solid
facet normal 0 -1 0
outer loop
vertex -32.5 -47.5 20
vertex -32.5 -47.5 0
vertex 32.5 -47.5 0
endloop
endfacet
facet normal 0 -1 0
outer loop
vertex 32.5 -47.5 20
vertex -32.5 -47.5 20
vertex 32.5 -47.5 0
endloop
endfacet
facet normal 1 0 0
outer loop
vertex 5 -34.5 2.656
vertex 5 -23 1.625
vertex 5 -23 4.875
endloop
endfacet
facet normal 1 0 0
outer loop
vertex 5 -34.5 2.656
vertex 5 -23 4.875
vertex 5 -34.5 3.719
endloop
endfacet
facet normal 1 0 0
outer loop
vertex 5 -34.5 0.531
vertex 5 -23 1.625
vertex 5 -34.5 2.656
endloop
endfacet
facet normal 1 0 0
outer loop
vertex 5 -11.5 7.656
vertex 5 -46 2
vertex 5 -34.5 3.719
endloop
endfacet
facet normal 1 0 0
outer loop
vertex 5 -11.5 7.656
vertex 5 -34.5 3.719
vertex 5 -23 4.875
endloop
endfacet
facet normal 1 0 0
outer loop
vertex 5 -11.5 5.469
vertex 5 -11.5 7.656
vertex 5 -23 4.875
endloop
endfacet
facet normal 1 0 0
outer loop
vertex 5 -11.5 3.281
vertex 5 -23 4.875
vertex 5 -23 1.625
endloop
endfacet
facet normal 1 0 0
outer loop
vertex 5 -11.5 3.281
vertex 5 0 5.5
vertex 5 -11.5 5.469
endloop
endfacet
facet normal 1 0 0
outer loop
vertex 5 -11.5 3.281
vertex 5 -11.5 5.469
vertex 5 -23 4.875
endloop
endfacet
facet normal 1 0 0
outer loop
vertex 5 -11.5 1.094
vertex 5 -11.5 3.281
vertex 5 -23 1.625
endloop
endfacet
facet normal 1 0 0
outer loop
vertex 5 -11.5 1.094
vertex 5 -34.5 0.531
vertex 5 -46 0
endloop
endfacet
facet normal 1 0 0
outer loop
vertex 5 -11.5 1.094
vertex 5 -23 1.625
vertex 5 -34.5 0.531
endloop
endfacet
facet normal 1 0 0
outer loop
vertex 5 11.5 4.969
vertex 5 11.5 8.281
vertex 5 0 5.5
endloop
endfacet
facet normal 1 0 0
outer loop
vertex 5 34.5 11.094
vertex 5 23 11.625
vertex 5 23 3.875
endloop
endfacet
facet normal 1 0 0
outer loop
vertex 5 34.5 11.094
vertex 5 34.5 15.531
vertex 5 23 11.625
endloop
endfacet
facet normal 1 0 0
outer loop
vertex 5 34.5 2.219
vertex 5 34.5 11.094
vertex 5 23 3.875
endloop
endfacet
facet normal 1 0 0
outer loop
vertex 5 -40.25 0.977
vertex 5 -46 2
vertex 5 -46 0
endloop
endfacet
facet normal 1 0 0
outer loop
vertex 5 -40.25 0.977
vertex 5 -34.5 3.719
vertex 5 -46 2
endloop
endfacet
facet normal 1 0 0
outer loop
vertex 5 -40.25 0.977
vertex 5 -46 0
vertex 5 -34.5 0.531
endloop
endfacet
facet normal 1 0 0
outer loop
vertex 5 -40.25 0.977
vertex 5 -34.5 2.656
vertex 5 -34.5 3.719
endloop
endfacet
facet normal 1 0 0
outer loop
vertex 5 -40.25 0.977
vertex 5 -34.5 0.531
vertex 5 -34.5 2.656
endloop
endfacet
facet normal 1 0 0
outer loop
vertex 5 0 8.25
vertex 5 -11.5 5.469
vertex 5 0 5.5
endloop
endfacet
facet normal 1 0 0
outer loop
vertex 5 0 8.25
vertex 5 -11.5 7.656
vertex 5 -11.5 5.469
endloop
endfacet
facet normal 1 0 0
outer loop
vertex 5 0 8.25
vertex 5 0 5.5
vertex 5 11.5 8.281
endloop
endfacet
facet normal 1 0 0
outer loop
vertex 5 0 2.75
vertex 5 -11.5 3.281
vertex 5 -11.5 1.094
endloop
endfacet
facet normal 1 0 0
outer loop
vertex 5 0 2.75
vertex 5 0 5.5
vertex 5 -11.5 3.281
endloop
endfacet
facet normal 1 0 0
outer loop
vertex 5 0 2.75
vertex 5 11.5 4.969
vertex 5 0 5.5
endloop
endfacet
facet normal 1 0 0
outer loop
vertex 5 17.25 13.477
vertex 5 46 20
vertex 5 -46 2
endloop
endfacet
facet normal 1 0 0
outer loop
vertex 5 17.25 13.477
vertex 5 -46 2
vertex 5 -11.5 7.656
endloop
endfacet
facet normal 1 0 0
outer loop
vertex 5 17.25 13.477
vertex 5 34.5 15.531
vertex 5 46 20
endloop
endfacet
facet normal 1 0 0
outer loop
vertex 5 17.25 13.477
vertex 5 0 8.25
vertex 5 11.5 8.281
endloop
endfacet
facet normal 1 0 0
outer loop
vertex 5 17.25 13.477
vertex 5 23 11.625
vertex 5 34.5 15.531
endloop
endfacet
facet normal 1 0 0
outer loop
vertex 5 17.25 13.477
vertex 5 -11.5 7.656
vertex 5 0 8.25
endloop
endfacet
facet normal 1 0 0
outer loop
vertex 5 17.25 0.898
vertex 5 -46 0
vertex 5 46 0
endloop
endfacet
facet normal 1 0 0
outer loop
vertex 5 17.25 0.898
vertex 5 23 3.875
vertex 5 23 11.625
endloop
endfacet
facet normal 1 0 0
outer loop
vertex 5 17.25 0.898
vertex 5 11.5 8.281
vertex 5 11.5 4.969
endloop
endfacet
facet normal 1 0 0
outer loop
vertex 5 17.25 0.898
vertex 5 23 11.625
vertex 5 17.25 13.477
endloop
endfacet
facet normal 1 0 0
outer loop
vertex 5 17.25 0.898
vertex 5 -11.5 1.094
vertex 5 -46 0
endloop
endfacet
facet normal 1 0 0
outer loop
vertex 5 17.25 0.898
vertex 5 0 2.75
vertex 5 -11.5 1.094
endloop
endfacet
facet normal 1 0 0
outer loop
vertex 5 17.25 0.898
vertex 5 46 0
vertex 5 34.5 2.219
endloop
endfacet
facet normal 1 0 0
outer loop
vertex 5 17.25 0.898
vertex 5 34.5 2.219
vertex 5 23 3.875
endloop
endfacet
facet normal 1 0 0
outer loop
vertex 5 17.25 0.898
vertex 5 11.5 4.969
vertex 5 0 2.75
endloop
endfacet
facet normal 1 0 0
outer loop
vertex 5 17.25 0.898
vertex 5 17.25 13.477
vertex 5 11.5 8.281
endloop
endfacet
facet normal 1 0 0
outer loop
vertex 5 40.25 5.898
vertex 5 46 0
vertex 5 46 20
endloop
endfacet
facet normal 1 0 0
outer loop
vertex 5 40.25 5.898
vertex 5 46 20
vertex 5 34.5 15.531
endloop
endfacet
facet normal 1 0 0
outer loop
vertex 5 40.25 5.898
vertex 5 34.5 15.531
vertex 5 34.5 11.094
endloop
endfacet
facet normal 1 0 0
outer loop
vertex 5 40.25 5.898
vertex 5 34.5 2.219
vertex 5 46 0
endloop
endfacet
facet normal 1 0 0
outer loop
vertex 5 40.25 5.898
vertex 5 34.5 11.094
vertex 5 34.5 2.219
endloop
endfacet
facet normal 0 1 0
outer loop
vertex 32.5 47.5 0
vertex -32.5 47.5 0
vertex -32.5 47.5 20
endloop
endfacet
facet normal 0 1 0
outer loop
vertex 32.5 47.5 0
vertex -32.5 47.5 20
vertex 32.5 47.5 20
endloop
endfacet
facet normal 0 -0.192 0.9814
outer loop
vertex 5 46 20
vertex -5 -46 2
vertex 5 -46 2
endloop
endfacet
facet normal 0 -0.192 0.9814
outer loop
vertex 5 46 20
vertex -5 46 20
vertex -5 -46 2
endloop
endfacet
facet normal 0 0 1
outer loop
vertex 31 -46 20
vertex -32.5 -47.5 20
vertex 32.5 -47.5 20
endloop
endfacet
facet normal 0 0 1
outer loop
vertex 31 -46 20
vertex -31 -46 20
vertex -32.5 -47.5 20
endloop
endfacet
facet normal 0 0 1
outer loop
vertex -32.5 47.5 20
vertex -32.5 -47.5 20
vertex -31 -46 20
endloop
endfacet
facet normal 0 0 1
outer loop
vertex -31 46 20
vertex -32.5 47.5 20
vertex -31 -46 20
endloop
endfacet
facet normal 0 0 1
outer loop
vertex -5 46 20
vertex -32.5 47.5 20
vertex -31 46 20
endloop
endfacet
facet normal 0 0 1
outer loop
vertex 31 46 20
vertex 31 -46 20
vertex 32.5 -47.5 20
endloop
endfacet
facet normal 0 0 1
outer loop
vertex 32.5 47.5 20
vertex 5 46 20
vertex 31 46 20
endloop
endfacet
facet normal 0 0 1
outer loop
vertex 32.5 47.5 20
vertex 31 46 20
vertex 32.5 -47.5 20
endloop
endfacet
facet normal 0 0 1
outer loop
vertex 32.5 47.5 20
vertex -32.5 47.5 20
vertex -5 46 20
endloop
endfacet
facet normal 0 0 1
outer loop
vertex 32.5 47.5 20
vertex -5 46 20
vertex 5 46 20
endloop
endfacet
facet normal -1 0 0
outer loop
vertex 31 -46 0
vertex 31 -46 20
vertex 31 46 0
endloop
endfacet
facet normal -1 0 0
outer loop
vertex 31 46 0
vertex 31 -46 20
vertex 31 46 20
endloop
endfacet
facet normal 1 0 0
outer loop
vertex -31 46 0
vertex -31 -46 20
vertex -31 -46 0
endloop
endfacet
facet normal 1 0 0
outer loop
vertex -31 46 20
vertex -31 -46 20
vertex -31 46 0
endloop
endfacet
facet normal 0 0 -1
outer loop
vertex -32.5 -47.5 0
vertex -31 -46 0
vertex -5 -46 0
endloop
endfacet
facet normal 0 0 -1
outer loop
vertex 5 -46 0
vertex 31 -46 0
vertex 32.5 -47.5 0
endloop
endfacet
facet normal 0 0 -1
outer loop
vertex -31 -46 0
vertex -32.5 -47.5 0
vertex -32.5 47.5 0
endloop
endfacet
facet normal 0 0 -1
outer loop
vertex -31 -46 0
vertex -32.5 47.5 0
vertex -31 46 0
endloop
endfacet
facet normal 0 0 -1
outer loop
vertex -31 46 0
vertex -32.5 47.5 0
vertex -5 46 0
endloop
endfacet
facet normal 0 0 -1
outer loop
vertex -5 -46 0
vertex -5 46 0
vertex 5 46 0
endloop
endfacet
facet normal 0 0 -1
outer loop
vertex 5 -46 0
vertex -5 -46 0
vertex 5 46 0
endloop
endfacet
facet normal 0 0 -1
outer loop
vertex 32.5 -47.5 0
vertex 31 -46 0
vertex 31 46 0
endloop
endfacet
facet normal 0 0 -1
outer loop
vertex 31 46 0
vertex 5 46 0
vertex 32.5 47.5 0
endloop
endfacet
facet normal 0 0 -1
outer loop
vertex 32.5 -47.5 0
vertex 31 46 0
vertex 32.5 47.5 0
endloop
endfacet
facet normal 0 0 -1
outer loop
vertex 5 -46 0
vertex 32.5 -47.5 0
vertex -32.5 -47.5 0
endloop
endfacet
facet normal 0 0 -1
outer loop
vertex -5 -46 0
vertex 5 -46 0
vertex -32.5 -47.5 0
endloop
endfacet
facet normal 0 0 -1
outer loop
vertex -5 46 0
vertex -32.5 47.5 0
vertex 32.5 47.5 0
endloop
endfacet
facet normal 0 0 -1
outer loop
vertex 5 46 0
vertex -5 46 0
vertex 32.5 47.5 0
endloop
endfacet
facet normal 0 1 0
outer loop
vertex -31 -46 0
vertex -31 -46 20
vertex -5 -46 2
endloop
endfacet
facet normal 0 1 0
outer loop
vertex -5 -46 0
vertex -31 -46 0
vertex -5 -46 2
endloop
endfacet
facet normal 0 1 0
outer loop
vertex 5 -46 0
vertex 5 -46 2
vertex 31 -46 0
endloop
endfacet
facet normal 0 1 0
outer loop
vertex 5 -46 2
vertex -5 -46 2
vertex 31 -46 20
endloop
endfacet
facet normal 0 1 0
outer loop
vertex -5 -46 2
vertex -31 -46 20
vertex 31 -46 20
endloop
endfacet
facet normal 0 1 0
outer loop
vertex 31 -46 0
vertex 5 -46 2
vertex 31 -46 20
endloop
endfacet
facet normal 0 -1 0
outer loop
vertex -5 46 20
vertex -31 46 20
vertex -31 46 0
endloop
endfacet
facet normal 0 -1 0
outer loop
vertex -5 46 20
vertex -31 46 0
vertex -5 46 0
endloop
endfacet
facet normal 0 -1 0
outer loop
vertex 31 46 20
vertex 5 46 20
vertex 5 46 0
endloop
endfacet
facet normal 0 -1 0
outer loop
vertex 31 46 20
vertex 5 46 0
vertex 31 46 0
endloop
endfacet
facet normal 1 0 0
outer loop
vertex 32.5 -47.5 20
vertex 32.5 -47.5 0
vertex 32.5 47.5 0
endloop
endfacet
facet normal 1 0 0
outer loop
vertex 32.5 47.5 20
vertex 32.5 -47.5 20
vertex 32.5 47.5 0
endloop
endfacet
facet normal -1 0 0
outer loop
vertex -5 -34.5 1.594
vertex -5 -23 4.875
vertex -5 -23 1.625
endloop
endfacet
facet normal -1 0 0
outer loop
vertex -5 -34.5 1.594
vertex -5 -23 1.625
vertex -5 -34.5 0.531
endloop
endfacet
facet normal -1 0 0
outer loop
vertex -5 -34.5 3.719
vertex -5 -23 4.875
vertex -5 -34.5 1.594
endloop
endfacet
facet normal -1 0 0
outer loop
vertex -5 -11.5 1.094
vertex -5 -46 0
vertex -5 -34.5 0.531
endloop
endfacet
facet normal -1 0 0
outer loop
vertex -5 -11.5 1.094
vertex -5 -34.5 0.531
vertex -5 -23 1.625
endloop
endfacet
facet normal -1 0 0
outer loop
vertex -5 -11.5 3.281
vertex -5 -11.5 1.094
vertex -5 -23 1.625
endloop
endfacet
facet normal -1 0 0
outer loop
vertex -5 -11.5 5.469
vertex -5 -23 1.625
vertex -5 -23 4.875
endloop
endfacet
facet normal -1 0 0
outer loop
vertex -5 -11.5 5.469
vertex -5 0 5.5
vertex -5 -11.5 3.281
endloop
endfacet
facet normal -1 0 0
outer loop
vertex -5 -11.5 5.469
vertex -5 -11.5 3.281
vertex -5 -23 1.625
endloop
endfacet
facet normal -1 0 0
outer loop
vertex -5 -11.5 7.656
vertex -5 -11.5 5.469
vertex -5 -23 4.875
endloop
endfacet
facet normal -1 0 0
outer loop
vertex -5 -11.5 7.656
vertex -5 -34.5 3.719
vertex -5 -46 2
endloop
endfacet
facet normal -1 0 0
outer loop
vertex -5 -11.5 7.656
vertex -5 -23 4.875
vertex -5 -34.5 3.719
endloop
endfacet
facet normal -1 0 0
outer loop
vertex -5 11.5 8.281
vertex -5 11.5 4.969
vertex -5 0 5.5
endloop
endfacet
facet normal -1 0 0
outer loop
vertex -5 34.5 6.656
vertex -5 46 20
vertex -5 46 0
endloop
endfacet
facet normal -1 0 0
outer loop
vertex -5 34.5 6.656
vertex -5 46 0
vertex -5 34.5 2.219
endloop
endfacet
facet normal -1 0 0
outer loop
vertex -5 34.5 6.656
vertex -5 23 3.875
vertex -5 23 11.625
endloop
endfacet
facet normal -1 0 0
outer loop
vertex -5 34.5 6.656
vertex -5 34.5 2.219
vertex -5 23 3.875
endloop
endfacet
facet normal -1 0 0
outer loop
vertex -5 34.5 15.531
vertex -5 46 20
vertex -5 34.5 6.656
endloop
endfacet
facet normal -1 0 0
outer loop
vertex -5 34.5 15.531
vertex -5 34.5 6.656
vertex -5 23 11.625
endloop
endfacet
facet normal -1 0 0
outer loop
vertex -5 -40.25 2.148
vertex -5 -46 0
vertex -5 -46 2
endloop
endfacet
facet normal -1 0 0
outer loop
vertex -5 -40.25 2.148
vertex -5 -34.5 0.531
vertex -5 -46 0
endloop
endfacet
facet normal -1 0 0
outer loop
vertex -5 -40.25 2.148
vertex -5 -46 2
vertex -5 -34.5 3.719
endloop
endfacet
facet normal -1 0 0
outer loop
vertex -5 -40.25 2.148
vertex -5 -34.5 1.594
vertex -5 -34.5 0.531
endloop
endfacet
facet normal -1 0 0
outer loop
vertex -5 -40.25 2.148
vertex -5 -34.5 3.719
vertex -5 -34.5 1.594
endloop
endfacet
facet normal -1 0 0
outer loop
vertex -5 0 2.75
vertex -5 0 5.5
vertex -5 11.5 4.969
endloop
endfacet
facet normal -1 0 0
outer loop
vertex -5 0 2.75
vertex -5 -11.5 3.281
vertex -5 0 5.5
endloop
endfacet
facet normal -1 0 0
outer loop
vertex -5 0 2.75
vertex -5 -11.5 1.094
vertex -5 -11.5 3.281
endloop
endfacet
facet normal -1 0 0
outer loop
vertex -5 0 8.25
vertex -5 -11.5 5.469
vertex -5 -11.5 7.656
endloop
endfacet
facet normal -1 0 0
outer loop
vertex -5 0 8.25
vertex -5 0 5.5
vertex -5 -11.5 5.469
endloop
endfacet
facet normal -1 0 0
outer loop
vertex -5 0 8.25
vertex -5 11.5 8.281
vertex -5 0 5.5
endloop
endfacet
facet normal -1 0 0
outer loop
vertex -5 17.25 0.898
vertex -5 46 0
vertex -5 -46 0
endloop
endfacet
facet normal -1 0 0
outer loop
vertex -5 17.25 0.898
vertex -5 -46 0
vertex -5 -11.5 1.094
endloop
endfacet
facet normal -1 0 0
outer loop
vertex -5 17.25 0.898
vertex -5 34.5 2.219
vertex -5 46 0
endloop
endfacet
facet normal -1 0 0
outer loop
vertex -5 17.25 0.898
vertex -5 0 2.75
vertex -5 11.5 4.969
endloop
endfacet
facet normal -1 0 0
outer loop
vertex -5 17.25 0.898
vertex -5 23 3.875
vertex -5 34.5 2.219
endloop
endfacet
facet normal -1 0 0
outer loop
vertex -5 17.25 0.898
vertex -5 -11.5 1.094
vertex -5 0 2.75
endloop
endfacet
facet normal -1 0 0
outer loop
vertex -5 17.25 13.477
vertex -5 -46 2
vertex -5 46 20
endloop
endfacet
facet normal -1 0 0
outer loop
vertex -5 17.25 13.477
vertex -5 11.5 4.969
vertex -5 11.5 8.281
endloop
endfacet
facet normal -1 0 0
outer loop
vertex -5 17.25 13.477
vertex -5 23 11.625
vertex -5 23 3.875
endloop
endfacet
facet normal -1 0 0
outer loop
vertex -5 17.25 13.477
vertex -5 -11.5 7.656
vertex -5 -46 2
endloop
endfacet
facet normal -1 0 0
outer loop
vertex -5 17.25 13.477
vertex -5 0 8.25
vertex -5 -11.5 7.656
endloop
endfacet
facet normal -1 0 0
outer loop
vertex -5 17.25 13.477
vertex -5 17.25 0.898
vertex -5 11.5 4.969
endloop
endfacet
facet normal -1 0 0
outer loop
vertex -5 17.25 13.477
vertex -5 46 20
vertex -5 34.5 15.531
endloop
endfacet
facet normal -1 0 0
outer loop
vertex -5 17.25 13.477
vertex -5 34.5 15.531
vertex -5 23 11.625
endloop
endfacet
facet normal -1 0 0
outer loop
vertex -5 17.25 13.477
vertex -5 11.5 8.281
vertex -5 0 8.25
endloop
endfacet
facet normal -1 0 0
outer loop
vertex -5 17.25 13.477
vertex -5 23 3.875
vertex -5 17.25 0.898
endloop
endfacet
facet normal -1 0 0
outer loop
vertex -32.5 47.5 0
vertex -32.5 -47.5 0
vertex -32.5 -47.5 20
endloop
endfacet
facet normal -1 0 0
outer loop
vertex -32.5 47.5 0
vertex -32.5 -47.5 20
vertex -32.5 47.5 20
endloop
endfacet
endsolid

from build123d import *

# Parameters (mm, degrees)
F0_W     = 65
F0_H     = 95
F1_DEPTH = 20
F2_W     = 62
F2_H     = 92
F3_DEPTH = 20
F5_W     = 10
F5_H     = 2
F4_W     = 10
F4_H     = 20


with BuildPart() as f1:
    # F0 (on Top) → F1 (new body)
    with BuildSketch(Plane.XY):
        Rectangle(F0_W, F0_H)
    extrude(amount=F1_DEPTH)

    # F2 (on face) → F3 (cut, through all)
    with BuildSketch(Plane.XY.offset(20)):
        Rectangle(F2_W, F2_H)
    extrude(amount=-F3_DEPTH, mode=Mode.SUBTRACT)

    # F5 (on face) → F6 section 0
    with BuildSketch(Plane(origin=(0, -46, 0), x_dir=(-1, 0, 0), z_dir=(0, 1, 0))):
        with Locations((0, 1)):
            Rectangle(F5_W, F5_H)
    # F4 (on face) → F6 section 1
    with BuildSketch(Plane.XZ.offset(-46)):
        with Locations((0, 10)):
            Rectangle(F4_W, F4_H)
    loft()


solid = f1.part
